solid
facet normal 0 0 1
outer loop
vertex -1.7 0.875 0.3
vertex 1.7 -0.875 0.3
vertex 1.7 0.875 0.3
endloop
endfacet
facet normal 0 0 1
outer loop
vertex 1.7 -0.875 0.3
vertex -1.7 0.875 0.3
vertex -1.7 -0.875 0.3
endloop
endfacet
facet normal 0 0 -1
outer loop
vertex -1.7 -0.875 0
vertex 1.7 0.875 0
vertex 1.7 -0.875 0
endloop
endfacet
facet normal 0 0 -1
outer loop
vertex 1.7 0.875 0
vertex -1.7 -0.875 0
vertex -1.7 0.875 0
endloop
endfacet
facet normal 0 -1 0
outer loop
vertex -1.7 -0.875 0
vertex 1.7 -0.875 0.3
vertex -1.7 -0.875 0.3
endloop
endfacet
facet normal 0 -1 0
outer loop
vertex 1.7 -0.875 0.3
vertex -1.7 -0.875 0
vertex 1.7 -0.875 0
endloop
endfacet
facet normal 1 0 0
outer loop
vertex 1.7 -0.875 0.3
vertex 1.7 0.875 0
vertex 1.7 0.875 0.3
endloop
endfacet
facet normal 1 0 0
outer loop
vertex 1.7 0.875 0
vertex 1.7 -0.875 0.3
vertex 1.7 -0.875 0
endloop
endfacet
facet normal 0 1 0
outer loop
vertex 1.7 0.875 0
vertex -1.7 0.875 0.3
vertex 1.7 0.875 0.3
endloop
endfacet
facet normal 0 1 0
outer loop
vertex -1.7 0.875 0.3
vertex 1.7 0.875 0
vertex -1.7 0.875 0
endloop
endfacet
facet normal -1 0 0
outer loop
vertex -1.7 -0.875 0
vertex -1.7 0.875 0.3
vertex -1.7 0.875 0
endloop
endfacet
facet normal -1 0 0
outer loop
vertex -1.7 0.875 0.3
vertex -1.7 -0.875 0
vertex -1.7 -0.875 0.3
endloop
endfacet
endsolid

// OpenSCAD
$fn = 96;

axial = [3.4, 1.75, 0.3];

translate([-axial[0]/2, -axial[1]/2, 0])
    cube(axial, center = false);
